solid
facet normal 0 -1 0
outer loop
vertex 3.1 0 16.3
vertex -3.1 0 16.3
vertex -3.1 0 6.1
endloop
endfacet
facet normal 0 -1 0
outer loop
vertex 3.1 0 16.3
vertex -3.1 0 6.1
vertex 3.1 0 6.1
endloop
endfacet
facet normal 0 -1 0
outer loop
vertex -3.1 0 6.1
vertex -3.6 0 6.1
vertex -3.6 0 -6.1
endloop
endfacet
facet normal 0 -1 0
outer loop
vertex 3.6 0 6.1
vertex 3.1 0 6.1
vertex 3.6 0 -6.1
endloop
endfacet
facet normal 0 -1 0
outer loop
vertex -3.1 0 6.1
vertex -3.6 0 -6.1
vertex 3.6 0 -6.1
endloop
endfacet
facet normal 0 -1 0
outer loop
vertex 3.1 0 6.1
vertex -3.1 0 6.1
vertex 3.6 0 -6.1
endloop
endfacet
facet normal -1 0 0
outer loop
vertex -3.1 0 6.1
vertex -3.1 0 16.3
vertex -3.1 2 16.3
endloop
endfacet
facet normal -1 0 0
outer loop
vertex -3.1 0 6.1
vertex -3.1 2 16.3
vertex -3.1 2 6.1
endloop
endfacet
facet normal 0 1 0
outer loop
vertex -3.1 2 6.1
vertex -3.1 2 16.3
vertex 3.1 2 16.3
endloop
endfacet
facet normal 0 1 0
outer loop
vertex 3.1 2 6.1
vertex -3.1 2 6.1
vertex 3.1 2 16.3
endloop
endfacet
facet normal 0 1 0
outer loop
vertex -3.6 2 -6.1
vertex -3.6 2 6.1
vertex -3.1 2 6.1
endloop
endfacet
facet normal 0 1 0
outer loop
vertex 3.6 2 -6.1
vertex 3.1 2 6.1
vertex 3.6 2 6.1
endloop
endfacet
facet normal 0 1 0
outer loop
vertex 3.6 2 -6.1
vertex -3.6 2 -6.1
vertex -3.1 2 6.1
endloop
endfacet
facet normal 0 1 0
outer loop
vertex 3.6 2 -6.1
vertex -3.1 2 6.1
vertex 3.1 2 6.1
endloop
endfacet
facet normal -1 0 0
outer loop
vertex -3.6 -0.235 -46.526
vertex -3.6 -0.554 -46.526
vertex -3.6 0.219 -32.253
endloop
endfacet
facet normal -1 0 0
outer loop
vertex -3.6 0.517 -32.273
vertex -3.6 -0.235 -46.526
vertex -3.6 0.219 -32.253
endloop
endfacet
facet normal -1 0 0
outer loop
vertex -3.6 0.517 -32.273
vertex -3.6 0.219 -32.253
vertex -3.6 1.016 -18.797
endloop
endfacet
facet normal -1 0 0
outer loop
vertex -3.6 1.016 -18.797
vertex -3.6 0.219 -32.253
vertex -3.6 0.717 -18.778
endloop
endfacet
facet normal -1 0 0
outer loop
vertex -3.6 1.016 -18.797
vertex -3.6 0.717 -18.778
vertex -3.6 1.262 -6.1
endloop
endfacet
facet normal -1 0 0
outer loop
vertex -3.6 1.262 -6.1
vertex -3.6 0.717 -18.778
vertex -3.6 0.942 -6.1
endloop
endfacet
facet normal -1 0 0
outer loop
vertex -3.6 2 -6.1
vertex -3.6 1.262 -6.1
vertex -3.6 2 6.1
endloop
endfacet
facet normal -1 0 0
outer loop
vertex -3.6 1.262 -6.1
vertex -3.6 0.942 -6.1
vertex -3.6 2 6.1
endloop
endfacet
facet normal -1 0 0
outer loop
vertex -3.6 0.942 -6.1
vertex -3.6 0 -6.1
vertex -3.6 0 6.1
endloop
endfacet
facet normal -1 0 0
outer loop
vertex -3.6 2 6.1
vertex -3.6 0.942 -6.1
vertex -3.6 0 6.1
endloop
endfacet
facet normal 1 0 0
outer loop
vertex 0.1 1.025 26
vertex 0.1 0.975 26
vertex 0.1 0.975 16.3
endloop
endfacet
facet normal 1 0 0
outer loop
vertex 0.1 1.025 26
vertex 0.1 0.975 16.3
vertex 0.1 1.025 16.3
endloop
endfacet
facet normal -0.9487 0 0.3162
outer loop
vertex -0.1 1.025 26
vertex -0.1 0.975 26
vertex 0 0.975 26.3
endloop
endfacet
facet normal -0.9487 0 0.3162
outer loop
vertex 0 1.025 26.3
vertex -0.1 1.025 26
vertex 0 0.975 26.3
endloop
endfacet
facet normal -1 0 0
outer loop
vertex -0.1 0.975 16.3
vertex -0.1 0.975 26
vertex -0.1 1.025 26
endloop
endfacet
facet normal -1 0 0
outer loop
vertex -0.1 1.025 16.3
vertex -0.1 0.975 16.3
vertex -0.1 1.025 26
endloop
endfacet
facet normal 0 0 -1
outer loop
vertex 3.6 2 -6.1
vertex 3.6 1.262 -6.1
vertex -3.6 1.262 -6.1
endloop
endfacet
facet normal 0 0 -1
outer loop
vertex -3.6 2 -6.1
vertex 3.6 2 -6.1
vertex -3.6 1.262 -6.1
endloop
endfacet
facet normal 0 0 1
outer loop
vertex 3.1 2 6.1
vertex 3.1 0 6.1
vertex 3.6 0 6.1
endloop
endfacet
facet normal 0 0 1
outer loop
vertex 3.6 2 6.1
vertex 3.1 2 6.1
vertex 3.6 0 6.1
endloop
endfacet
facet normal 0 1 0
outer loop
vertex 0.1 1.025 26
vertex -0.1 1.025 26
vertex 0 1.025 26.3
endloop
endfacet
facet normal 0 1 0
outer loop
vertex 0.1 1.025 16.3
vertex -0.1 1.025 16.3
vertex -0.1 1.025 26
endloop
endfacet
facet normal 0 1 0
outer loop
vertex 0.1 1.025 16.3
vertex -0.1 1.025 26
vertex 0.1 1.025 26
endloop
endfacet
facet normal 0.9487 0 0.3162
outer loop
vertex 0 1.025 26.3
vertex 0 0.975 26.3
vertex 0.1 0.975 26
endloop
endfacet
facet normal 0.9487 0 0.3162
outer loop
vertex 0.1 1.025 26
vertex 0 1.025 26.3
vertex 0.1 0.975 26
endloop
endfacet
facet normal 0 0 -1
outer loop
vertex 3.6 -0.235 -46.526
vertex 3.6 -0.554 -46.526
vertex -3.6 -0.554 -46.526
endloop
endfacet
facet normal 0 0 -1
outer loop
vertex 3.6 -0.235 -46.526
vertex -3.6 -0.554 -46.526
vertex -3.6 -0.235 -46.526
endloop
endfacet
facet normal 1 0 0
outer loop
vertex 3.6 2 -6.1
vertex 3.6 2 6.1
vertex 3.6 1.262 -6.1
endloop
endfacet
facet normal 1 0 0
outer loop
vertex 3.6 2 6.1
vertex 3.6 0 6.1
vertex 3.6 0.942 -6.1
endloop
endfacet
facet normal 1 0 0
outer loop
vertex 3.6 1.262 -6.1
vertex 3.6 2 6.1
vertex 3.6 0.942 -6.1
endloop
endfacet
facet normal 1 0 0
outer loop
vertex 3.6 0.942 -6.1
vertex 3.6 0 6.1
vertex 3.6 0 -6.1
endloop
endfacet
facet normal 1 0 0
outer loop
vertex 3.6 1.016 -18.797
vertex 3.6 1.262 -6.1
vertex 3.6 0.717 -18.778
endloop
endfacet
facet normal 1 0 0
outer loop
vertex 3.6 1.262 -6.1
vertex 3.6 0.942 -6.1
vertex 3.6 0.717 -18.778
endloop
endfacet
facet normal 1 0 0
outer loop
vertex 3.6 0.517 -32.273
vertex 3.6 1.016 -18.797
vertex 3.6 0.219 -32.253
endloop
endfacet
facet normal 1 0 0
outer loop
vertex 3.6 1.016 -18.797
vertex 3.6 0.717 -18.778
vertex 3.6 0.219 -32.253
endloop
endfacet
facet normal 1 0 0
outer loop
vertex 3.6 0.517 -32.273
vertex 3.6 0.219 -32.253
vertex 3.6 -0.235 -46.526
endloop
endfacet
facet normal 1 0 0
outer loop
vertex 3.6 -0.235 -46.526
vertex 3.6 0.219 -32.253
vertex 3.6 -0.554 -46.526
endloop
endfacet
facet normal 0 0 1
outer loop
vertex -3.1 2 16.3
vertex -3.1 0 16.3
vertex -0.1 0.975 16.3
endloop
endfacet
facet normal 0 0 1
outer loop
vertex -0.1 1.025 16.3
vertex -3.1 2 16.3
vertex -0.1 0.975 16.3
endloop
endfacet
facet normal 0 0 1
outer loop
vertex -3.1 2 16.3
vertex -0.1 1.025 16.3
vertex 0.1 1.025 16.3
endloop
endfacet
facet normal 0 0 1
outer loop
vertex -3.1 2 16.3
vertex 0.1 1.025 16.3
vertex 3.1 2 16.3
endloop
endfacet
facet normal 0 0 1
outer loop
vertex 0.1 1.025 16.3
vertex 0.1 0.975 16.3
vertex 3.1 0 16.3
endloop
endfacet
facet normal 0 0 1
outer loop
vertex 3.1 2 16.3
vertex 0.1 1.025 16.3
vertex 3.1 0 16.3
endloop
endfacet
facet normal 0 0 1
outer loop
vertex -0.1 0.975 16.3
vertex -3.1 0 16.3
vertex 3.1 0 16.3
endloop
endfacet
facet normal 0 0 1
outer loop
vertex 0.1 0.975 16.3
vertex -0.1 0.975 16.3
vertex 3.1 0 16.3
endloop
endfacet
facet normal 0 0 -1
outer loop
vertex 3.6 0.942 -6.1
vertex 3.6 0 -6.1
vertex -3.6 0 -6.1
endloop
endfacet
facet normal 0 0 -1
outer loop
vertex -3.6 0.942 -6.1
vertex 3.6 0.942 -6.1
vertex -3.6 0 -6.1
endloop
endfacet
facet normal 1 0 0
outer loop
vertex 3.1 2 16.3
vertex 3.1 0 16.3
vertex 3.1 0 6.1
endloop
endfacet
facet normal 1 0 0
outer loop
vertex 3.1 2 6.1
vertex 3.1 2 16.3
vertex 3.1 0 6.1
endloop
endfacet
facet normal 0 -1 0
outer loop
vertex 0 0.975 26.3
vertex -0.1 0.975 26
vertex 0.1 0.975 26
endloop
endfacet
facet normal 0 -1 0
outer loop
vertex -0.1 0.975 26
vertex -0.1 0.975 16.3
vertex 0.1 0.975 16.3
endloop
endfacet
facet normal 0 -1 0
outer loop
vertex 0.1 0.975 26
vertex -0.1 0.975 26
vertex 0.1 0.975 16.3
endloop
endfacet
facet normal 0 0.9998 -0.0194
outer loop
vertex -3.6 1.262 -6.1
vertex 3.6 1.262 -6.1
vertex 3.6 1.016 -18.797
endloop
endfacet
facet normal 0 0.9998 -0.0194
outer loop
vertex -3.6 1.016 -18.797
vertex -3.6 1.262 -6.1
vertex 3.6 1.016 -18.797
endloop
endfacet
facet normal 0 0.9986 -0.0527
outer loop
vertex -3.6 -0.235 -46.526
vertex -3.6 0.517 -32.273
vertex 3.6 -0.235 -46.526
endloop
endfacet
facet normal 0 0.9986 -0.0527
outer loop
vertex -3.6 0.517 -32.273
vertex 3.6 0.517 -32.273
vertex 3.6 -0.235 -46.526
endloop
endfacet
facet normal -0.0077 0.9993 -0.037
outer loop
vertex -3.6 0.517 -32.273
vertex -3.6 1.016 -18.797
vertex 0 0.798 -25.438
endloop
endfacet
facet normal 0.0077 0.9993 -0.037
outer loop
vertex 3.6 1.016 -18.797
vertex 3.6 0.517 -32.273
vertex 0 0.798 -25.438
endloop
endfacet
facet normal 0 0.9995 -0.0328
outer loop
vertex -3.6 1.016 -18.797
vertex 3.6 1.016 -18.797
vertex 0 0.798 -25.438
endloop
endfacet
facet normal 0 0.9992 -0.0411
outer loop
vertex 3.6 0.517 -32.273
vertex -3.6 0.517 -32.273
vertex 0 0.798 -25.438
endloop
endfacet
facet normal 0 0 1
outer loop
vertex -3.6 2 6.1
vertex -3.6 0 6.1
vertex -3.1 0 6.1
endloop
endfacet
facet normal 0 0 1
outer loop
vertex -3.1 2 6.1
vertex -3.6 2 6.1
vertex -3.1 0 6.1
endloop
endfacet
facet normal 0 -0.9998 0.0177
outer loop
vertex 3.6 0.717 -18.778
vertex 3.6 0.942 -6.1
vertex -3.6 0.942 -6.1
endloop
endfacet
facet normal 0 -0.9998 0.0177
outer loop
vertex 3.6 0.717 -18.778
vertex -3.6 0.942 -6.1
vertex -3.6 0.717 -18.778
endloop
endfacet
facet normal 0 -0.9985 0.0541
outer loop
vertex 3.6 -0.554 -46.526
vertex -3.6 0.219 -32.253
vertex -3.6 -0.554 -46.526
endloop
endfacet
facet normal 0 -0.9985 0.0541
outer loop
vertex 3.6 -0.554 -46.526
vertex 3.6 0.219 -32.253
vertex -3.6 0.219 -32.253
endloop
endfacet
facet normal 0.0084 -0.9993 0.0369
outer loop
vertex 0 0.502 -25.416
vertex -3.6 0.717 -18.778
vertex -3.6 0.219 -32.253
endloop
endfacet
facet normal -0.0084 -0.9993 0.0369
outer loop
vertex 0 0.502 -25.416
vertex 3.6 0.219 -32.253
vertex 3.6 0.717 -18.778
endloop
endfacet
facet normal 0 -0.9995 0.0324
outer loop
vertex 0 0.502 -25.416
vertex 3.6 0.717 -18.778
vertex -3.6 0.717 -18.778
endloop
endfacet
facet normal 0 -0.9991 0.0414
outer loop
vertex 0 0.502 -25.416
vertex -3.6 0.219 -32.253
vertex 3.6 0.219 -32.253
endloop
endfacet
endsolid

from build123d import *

# Parameters (mm, degrees)
SKETCH1_W           = 6.2
SKETCH1_H           = 10.2
BOSS_EXTRUDE1_DEPTH = 2
SKETCH3_W           = 0.2
SKETCH3_H           = 0.05
BOSS_EXTRUDE3_DEPTH = 10
CUT_EXTRUDE1_DEPTH  = 0.05
BOSS_EXTRUDE4_DEPTH = 7.2


with BuildPart() as part:
    # Sketch1 → Boss-Extrude1 (new body)
    with BuildSketch(Plane(origin=(0, 0, 0), x_dir=(1, 0, 0), z_dir=(0, 1, 0))):
        Polygon((-3.6, -6.1), (-3.1, -6.1), (3.1, -6.1), (3.6, -6.1), (3.6, 6.1), (-3.6, 6.1), align=None)
        with Locations((0, -11.2)):
            Rectangle(SKETCH1_W, SKETCH1_H)
    extrude(amount=BOSS_EXTRUDE1_DEPTH)

    # Sketch3 → Boss-Extrude3 (add)
    with BuildSketch(Plane.XY.offset(16.3)):
        with Locations((0, 1)):
            Rectangle(SKETCH3_W, SKETCH3_H)
    extrude(amount=BOSS_EXTRUDE3_DEPTH)

    # Sketch4 → Cut-Extrude1 (cut)
    with BuildSketch(Plane.XZ.offset(-0.975)):
        Polygon((0.1, 26.3), (0, 26.3), (0.1, 26), align=None)
        Polygon((-0.1, 26.3), (-0.1, 26), (0, 26.3), align=None)
    extrude(amount=-CUT_EXTRUDE1_DEPTH, mode=Mode.SUBTRACT)

    # Sketch5 → Boss-Extrude4 (add)
    with BuildSketch(Plane(origin=(3.6, 0, 0), x_dir=(0, 0, -1), z_dir=(1, 0, 0))):
        with BuildLine():
            Line((6.1, 1.261801628), (6.1, 0.942348221))
            add(Edge.make_bspline(
                [(6.1, 0.942348221), (24.518318323, 0.810344541), (46.52588684, -0.554134336)],
                knots=[0, 0, 0, 1, 1, 1], degree=2))
            Line((46.52588684, -0.554134336), (46.52588684, -0.234680929))
            add(Edge.make_bspline(
                [(6.1, 1.261801628), (24.562430755, 1.083380731), (46.52588684, -0.234680929)],
                knots=[0, 0, 0, 1, 1, 1], degree=2))
        make_face()
    extrude(amount=-BOSS_EXTRUDE4_DEPTH)


solid = part.part
